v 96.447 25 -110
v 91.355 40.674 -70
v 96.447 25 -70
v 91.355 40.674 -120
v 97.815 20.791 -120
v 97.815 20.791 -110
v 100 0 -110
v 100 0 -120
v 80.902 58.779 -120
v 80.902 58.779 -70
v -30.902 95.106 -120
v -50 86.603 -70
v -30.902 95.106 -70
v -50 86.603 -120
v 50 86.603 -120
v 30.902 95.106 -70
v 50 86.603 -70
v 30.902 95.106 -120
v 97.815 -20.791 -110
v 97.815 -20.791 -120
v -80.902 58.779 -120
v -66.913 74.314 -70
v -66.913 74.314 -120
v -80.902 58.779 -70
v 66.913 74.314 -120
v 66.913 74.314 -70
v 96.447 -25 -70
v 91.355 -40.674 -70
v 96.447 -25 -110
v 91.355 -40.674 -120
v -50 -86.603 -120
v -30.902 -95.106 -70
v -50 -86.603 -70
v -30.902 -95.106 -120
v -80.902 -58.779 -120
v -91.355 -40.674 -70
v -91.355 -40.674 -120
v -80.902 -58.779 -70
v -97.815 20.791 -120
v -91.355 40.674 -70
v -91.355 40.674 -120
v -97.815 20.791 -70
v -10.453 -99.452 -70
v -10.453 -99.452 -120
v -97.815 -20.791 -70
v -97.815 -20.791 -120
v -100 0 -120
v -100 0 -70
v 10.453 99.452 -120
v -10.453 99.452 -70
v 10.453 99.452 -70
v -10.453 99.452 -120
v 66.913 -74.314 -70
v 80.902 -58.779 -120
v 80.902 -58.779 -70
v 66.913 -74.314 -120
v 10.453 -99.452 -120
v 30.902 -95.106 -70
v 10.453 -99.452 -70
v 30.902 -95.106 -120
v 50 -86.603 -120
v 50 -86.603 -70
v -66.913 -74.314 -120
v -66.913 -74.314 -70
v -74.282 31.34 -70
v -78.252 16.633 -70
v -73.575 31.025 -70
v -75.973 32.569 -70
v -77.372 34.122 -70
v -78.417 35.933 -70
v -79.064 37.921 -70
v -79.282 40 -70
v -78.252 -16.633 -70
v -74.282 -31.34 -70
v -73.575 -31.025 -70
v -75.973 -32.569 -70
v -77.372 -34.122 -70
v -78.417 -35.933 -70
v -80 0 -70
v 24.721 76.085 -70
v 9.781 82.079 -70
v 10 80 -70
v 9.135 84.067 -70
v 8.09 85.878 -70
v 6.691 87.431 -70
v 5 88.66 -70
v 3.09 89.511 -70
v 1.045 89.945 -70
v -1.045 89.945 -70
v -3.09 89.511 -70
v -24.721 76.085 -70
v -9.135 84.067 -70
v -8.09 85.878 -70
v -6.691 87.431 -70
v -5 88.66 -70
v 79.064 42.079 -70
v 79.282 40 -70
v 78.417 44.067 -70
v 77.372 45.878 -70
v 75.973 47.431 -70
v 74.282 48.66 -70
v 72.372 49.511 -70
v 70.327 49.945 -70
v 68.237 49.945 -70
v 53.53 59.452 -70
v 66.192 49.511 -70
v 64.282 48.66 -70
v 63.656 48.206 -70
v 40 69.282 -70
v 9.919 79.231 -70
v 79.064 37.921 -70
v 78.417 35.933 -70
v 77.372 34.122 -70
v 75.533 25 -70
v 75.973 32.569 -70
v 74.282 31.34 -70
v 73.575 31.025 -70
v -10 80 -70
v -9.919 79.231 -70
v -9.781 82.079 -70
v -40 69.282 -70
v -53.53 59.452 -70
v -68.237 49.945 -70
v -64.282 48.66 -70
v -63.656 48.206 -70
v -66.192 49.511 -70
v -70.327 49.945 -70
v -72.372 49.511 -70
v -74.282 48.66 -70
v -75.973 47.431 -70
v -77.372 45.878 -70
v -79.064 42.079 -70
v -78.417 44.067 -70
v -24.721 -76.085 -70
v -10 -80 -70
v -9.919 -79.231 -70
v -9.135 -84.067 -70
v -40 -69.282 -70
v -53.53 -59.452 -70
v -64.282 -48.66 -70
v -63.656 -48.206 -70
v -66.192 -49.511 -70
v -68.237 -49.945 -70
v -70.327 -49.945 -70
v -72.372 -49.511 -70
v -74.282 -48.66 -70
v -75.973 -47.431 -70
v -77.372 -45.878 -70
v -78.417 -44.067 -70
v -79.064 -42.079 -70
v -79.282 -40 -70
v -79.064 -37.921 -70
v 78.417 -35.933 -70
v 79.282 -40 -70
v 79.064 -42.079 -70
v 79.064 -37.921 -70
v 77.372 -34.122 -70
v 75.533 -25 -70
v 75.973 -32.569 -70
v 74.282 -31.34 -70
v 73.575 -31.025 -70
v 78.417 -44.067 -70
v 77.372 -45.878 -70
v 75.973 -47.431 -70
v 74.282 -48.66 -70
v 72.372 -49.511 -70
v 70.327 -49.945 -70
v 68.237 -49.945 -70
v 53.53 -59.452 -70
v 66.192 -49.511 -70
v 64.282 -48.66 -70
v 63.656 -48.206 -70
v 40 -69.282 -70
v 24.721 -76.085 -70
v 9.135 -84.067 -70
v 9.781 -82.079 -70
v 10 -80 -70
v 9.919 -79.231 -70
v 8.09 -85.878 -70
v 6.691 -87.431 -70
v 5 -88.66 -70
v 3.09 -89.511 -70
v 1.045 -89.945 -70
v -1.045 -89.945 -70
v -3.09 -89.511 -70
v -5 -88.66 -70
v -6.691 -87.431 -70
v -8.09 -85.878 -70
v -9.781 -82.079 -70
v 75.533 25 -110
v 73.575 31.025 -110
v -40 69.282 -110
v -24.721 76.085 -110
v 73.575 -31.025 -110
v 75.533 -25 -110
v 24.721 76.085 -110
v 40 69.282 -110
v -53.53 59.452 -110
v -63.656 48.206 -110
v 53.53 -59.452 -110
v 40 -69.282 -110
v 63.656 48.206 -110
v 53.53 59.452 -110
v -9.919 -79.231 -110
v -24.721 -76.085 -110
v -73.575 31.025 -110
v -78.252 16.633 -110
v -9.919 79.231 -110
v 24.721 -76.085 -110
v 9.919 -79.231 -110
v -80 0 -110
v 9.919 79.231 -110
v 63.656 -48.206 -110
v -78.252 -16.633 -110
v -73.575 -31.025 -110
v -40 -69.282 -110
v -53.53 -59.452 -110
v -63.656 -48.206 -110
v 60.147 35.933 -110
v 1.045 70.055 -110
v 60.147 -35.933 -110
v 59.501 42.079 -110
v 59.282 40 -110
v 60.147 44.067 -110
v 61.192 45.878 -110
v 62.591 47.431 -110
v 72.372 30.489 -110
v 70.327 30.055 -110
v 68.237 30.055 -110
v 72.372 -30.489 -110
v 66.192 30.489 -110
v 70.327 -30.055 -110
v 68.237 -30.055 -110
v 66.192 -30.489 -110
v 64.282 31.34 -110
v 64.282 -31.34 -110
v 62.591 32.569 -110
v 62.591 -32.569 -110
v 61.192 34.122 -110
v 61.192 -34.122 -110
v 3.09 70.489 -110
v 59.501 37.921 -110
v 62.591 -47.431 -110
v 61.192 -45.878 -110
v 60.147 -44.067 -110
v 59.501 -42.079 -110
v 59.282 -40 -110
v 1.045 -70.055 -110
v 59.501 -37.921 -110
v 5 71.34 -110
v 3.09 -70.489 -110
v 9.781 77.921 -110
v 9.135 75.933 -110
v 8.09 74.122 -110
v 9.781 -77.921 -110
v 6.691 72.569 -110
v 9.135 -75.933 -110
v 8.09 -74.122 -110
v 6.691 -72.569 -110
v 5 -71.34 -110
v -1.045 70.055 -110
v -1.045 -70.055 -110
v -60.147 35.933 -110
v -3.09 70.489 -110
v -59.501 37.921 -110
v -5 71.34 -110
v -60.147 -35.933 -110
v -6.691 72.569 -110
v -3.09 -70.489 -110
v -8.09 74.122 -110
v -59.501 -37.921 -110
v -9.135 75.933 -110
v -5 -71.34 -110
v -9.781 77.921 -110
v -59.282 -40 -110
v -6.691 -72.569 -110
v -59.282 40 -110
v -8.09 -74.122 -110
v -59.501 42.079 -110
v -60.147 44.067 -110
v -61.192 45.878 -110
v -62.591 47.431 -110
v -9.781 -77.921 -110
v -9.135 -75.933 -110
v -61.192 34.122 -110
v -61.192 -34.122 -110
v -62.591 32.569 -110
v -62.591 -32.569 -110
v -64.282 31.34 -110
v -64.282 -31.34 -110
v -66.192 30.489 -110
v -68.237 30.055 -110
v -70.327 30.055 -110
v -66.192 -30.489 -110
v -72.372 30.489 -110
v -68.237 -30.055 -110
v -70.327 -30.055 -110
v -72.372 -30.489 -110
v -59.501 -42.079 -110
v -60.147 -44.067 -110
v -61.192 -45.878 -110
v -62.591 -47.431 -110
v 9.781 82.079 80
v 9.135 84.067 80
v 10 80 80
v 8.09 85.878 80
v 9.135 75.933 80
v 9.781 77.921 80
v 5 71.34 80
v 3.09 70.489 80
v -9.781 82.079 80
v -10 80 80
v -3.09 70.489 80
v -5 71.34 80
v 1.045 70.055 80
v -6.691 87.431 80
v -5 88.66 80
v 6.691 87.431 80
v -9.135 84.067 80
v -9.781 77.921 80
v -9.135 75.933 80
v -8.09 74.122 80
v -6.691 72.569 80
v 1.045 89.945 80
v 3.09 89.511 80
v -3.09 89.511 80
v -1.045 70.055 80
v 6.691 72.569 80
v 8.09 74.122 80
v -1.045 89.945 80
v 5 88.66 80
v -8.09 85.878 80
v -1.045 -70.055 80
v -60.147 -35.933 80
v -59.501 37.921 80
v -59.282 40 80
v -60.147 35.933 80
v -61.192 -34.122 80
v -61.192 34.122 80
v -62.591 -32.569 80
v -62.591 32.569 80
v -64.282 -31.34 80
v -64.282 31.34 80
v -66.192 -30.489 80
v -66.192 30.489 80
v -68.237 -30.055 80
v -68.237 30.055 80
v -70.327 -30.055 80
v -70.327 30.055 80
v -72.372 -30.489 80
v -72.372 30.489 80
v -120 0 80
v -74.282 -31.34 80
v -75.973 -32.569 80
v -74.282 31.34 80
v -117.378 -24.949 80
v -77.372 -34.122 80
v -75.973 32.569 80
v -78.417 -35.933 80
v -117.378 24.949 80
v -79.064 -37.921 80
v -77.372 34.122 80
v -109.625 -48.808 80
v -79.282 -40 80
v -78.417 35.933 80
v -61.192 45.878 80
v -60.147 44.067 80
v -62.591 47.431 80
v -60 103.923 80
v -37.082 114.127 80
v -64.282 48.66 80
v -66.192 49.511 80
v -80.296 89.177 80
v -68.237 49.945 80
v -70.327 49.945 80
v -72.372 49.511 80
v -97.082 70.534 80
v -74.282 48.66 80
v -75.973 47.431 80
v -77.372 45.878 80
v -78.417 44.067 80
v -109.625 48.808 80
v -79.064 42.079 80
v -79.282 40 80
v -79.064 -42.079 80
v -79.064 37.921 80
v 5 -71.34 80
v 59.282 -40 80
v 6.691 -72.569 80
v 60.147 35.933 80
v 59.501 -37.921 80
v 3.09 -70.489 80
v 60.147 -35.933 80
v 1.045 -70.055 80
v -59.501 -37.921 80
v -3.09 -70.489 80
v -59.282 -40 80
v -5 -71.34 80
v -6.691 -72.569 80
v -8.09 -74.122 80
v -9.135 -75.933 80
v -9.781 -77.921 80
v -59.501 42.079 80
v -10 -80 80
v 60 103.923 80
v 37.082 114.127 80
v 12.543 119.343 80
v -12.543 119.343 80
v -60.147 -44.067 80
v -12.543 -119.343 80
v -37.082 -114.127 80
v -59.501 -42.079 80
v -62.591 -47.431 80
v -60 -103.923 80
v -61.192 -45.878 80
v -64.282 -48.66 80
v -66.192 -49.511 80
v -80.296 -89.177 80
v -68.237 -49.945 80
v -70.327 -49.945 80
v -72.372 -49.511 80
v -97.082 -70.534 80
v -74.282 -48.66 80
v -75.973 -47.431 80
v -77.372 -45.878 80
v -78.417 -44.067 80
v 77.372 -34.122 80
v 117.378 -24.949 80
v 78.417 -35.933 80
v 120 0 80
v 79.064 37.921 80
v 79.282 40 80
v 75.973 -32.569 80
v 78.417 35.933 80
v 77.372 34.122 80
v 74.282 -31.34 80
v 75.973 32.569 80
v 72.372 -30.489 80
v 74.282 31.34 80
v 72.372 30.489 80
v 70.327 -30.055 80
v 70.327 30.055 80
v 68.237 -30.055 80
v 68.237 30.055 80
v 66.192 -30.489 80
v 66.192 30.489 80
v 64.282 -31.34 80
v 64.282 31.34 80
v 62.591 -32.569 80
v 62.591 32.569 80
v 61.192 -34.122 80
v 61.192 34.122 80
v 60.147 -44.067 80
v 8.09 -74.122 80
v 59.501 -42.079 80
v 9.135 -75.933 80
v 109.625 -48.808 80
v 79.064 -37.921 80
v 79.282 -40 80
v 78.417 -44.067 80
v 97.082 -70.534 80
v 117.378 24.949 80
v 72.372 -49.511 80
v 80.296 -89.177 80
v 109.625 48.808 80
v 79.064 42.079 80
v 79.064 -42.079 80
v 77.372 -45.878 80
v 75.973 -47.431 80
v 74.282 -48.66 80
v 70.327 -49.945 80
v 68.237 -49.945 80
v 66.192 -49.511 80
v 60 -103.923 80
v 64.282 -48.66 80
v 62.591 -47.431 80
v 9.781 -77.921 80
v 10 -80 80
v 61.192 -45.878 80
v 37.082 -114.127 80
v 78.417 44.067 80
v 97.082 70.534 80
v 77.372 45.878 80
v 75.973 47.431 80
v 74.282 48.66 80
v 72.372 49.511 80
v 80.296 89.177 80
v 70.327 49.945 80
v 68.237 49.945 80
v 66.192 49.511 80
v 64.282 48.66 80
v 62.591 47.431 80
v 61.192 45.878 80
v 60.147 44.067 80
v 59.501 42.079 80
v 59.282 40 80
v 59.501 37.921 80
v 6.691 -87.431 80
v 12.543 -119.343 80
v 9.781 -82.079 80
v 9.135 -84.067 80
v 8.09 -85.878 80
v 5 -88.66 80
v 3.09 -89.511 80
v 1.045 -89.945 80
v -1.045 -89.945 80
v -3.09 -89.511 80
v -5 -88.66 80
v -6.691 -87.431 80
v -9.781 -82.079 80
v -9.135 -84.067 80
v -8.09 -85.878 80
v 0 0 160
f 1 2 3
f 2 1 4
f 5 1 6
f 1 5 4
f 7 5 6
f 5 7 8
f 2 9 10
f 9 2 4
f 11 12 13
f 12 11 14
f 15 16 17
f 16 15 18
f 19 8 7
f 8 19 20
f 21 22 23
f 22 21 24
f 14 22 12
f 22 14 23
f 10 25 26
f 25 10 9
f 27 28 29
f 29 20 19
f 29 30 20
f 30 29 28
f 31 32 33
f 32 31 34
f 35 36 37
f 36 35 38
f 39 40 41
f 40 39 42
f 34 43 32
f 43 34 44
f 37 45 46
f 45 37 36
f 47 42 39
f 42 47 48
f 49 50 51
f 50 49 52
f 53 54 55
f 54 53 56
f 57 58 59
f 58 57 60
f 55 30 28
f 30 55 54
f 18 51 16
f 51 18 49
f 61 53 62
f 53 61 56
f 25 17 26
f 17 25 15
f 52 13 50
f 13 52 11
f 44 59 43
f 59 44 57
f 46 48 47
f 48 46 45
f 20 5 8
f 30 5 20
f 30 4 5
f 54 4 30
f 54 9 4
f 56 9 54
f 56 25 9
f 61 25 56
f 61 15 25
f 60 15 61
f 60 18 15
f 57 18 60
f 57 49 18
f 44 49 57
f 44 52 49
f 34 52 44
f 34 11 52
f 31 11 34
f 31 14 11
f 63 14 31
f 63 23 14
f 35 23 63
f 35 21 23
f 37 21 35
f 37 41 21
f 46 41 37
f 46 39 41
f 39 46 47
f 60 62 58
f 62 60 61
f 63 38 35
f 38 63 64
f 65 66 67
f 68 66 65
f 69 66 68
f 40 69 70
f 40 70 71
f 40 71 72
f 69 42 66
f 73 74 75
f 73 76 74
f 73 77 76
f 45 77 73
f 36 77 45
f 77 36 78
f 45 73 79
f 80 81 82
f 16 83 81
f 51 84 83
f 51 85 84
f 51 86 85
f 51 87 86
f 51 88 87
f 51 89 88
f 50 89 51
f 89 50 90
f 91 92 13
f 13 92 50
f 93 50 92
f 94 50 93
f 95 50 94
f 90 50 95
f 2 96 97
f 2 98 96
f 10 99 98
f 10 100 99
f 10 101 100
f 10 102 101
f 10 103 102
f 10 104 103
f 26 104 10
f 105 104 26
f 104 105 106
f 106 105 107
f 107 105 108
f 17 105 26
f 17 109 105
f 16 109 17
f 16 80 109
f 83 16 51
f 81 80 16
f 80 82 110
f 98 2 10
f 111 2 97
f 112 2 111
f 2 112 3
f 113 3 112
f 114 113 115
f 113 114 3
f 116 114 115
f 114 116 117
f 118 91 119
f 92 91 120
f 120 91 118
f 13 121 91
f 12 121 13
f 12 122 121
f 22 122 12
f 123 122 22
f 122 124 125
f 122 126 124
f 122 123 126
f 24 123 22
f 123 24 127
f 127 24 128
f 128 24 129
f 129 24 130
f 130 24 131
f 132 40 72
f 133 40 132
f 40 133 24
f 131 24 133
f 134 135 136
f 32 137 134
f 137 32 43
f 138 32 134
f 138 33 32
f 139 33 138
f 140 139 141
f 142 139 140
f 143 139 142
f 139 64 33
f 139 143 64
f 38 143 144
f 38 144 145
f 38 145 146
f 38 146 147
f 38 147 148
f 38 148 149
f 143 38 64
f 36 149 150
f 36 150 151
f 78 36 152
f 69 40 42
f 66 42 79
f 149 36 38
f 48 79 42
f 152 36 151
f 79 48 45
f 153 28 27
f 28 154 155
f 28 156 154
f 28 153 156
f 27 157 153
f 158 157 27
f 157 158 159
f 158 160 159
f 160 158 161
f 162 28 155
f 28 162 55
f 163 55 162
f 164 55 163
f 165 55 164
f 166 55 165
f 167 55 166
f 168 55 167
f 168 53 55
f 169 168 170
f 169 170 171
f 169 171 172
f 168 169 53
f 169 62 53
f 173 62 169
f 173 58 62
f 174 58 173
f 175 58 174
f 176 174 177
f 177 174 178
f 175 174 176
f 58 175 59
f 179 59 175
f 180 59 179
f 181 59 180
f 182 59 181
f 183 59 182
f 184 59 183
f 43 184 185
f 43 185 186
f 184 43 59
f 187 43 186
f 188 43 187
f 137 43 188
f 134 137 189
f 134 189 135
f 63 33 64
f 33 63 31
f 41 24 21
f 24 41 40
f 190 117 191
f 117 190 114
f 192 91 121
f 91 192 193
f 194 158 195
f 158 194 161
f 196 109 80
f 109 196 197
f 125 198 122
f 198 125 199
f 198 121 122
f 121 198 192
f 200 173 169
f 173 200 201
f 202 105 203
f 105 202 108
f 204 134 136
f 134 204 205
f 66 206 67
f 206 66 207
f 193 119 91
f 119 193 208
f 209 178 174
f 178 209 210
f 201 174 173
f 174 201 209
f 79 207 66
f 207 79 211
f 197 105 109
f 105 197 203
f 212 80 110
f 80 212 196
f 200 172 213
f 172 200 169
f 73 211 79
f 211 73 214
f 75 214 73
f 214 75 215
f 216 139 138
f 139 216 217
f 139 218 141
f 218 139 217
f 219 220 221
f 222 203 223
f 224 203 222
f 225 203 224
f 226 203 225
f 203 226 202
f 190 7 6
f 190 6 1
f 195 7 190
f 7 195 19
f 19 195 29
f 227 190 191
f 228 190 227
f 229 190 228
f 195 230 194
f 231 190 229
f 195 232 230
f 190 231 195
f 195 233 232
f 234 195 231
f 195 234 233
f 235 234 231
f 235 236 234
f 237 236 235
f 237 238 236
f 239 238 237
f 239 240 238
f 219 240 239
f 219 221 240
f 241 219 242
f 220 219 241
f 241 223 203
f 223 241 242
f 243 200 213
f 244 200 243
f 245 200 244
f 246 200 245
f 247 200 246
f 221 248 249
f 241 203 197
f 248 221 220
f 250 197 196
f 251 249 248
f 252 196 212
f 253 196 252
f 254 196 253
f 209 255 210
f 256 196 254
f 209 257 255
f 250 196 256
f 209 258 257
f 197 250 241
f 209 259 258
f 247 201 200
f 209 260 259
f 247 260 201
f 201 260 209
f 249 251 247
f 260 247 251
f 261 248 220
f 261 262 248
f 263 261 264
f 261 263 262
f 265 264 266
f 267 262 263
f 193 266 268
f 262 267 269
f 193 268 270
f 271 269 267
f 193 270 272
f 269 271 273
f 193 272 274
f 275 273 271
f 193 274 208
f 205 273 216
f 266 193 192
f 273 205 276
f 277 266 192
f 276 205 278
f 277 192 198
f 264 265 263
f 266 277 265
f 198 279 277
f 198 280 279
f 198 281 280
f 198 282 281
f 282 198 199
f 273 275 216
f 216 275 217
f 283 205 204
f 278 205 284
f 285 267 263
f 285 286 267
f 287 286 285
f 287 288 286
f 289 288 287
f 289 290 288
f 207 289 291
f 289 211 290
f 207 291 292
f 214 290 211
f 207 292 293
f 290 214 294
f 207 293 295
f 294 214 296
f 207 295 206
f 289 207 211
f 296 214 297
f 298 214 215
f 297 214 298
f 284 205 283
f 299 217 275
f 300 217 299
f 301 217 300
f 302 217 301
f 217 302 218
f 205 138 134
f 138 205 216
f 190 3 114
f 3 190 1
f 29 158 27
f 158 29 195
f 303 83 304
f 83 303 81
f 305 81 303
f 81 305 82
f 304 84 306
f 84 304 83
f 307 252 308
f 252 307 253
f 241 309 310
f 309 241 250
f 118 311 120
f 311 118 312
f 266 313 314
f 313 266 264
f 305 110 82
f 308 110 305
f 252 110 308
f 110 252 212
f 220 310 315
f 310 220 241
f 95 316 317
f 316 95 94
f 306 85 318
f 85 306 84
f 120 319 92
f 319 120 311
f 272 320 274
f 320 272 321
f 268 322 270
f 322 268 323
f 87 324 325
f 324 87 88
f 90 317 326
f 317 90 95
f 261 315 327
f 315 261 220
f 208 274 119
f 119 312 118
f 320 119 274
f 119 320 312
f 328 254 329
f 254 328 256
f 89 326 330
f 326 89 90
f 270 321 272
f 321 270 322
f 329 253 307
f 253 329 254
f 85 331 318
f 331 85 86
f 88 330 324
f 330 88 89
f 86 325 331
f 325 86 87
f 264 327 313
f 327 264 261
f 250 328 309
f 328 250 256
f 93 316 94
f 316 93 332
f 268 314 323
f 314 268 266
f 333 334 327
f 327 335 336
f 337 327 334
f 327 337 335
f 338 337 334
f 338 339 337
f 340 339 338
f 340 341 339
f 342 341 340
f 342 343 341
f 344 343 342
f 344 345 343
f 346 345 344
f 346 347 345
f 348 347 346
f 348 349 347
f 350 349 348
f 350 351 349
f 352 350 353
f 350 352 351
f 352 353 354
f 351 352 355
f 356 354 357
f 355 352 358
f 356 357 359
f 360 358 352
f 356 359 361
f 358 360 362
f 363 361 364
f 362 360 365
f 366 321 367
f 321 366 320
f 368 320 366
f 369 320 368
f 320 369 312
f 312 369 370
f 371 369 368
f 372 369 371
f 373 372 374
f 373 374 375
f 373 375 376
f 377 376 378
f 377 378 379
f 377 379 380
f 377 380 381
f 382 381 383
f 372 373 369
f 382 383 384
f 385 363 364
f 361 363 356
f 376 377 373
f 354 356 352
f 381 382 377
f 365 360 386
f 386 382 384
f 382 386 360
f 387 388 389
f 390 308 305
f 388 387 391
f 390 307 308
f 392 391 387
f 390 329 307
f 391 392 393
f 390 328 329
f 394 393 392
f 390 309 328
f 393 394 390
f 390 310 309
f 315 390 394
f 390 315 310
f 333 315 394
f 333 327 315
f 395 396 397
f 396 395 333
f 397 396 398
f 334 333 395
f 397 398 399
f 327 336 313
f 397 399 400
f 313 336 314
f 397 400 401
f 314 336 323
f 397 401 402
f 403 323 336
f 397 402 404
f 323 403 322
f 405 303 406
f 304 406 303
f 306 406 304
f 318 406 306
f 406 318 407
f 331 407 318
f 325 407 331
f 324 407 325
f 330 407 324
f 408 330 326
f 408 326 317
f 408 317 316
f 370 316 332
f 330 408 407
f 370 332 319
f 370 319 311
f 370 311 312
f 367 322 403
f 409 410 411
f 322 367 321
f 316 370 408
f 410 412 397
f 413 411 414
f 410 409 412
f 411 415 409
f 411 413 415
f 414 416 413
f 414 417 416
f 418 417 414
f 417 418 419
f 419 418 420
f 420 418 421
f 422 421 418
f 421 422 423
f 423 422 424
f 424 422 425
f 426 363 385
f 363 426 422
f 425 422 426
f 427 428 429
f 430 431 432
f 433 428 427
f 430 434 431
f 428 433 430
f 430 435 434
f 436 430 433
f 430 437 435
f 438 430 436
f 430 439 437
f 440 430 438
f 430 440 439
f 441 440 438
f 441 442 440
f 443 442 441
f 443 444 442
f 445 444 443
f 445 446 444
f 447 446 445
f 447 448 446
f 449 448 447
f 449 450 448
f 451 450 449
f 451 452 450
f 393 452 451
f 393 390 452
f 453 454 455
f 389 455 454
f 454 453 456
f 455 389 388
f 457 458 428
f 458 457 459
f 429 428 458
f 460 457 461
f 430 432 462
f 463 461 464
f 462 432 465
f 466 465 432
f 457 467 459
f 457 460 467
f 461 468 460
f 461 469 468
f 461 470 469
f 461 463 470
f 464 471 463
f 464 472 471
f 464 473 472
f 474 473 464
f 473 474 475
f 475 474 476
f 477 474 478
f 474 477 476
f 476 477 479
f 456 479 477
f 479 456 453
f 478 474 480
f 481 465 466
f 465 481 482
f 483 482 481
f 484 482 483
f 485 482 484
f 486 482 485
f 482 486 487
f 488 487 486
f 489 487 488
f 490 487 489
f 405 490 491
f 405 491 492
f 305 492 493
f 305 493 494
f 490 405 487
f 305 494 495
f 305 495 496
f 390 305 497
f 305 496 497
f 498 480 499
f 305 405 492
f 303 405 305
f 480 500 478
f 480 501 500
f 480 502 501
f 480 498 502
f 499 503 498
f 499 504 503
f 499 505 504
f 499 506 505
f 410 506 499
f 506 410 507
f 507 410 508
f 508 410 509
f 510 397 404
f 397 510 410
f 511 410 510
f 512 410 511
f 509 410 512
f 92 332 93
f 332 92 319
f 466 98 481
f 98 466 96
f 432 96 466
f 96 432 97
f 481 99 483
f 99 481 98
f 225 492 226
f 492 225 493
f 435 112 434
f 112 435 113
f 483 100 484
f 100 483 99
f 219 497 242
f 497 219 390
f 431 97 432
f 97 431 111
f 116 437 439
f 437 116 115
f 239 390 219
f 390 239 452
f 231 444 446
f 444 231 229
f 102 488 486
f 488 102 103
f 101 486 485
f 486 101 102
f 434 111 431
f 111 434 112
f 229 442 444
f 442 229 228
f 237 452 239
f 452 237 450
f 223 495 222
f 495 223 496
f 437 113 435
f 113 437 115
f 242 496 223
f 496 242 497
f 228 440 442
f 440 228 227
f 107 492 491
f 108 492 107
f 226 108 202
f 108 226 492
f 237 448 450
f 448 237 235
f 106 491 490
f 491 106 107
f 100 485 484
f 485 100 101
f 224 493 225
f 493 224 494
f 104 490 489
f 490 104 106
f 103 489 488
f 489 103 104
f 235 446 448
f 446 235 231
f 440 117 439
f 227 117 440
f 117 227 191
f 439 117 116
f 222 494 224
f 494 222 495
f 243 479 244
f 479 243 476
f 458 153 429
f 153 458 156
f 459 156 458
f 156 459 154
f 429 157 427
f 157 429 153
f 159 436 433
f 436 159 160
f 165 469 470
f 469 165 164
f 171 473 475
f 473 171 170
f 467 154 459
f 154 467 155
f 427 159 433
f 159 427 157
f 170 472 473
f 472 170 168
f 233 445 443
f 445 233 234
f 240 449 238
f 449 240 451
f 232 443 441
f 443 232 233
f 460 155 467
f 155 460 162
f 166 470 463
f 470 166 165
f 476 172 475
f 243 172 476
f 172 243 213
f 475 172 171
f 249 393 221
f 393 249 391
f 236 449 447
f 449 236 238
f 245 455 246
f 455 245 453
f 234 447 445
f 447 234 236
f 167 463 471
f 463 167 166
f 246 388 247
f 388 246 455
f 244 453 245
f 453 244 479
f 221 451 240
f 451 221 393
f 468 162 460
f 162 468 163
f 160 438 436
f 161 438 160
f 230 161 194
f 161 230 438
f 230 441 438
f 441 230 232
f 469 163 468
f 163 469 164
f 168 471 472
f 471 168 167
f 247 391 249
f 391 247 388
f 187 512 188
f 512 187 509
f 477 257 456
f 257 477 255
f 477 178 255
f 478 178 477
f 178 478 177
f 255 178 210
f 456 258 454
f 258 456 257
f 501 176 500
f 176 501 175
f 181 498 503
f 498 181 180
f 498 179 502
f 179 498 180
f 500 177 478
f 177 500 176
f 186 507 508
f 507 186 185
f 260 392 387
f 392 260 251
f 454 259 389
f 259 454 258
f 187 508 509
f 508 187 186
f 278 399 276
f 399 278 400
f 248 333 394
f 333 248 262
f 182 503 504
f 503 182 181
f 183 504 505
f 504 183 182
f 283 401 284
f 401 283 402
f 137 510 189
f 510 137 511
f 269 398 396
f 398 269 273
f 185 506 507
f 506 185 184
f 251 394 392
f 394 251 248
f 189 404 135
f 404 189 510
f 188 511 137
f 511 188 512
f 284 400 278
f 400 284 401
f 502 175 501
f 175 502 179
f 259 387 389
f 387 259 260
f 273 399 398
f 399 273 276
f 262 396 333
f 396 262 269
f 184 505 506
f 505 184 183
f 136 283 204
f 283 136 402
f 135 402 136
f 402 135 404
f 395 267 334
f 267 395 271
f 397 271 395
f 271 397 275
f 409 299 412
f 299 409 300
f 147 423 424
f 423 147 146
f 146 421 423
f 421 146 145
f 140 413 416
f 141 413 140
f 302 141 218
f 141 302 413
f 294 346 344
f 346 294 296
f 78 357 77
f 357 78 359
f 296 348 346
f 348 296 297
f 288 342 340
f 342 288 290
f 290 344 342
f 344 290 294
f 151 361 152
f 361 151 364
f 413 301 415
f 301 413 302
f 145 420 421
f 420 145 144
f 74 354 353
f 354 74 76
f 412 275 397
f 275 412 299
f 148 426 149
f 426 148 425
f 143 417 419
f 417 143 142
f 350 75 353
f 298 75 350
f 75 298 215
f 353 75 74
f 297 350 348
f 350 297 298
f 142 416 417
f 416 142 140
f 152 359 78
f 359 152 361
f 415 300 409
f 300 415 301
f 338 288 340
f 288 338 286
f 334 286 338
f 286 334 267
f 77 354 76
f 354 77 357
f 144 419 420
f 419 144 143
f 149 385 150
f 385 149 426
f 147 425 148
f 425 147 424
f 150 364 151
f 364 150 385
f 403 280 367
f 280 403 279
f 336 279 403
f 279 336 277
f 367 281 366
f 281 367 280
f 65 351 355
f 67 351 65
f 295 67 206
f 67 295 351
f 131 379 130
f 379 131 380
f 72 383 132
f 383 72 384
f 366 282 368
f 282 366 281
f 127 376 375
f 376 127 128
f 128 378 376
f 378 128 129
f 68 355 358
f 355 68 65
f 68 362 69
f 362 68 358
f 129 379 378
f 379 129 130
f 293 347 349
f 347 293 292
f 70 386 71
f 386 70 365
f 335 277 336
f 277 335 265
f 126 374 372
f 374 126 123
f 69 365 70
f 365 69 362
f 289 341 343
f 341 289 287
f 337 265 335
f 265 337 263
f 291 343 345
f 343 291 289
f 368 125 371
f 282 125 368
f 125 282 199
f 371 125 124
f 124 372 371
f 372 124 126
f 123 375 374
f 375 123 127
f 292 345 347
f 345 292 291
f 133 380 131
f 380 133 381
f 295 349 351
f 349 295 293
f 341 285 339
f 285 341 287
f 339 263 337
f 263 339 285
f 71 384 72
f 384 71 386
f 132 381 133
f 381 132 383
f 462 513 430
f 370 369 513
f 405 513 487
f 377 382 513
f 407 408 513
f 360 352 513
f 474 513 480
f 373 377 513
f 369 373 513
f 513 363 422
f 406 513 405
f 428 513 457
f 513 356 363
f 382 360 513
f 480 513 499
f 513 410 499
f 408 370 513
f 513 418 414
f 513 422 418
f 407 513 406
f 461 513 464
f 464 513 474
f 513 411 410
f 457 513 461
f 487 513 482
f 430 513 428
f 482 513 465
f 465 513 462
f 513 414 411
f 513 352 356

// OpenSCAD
module example005()
{
  translate([0, 0, -120]) {
    difference() {
      cylinder(h = 50, r = 100);
      translate([0, 0, 10]) cylinder(h = 50, r = 80);
      translate([100, 0, 35]) cube(50, center = true);
    }
    for (i = [0:5]) {
      echo(360*i/6, sin(360*i/6)*80, cos(360*i/6)*80);
      translate([sin(360*i/6)*80, cos(360*i/6)*80, 0 ])
        cylinder(h = 200, r=10);
    }
    translate([0, 0, 200])
      cylinder(h = 80, r1 = 120, r2 = 0);
  }
}

echo(version=version());

example005();

// Written by Clifford Wolf <clifford@clifford.at> and Marius
// Kintel <marius@kintel.net>
//
// To the extent possible under law, the author(s) have dedicated all
// copyright and related and neighboring rights to this software to the
// public domain worldwide. This software is distributed without any
// warranty.
//
// You should have received a copy of the CC0 Public Domain
// Dedication along with this software.
// If not, see <http://creativecommons.org/publicdomain/zero/1.0/>.
